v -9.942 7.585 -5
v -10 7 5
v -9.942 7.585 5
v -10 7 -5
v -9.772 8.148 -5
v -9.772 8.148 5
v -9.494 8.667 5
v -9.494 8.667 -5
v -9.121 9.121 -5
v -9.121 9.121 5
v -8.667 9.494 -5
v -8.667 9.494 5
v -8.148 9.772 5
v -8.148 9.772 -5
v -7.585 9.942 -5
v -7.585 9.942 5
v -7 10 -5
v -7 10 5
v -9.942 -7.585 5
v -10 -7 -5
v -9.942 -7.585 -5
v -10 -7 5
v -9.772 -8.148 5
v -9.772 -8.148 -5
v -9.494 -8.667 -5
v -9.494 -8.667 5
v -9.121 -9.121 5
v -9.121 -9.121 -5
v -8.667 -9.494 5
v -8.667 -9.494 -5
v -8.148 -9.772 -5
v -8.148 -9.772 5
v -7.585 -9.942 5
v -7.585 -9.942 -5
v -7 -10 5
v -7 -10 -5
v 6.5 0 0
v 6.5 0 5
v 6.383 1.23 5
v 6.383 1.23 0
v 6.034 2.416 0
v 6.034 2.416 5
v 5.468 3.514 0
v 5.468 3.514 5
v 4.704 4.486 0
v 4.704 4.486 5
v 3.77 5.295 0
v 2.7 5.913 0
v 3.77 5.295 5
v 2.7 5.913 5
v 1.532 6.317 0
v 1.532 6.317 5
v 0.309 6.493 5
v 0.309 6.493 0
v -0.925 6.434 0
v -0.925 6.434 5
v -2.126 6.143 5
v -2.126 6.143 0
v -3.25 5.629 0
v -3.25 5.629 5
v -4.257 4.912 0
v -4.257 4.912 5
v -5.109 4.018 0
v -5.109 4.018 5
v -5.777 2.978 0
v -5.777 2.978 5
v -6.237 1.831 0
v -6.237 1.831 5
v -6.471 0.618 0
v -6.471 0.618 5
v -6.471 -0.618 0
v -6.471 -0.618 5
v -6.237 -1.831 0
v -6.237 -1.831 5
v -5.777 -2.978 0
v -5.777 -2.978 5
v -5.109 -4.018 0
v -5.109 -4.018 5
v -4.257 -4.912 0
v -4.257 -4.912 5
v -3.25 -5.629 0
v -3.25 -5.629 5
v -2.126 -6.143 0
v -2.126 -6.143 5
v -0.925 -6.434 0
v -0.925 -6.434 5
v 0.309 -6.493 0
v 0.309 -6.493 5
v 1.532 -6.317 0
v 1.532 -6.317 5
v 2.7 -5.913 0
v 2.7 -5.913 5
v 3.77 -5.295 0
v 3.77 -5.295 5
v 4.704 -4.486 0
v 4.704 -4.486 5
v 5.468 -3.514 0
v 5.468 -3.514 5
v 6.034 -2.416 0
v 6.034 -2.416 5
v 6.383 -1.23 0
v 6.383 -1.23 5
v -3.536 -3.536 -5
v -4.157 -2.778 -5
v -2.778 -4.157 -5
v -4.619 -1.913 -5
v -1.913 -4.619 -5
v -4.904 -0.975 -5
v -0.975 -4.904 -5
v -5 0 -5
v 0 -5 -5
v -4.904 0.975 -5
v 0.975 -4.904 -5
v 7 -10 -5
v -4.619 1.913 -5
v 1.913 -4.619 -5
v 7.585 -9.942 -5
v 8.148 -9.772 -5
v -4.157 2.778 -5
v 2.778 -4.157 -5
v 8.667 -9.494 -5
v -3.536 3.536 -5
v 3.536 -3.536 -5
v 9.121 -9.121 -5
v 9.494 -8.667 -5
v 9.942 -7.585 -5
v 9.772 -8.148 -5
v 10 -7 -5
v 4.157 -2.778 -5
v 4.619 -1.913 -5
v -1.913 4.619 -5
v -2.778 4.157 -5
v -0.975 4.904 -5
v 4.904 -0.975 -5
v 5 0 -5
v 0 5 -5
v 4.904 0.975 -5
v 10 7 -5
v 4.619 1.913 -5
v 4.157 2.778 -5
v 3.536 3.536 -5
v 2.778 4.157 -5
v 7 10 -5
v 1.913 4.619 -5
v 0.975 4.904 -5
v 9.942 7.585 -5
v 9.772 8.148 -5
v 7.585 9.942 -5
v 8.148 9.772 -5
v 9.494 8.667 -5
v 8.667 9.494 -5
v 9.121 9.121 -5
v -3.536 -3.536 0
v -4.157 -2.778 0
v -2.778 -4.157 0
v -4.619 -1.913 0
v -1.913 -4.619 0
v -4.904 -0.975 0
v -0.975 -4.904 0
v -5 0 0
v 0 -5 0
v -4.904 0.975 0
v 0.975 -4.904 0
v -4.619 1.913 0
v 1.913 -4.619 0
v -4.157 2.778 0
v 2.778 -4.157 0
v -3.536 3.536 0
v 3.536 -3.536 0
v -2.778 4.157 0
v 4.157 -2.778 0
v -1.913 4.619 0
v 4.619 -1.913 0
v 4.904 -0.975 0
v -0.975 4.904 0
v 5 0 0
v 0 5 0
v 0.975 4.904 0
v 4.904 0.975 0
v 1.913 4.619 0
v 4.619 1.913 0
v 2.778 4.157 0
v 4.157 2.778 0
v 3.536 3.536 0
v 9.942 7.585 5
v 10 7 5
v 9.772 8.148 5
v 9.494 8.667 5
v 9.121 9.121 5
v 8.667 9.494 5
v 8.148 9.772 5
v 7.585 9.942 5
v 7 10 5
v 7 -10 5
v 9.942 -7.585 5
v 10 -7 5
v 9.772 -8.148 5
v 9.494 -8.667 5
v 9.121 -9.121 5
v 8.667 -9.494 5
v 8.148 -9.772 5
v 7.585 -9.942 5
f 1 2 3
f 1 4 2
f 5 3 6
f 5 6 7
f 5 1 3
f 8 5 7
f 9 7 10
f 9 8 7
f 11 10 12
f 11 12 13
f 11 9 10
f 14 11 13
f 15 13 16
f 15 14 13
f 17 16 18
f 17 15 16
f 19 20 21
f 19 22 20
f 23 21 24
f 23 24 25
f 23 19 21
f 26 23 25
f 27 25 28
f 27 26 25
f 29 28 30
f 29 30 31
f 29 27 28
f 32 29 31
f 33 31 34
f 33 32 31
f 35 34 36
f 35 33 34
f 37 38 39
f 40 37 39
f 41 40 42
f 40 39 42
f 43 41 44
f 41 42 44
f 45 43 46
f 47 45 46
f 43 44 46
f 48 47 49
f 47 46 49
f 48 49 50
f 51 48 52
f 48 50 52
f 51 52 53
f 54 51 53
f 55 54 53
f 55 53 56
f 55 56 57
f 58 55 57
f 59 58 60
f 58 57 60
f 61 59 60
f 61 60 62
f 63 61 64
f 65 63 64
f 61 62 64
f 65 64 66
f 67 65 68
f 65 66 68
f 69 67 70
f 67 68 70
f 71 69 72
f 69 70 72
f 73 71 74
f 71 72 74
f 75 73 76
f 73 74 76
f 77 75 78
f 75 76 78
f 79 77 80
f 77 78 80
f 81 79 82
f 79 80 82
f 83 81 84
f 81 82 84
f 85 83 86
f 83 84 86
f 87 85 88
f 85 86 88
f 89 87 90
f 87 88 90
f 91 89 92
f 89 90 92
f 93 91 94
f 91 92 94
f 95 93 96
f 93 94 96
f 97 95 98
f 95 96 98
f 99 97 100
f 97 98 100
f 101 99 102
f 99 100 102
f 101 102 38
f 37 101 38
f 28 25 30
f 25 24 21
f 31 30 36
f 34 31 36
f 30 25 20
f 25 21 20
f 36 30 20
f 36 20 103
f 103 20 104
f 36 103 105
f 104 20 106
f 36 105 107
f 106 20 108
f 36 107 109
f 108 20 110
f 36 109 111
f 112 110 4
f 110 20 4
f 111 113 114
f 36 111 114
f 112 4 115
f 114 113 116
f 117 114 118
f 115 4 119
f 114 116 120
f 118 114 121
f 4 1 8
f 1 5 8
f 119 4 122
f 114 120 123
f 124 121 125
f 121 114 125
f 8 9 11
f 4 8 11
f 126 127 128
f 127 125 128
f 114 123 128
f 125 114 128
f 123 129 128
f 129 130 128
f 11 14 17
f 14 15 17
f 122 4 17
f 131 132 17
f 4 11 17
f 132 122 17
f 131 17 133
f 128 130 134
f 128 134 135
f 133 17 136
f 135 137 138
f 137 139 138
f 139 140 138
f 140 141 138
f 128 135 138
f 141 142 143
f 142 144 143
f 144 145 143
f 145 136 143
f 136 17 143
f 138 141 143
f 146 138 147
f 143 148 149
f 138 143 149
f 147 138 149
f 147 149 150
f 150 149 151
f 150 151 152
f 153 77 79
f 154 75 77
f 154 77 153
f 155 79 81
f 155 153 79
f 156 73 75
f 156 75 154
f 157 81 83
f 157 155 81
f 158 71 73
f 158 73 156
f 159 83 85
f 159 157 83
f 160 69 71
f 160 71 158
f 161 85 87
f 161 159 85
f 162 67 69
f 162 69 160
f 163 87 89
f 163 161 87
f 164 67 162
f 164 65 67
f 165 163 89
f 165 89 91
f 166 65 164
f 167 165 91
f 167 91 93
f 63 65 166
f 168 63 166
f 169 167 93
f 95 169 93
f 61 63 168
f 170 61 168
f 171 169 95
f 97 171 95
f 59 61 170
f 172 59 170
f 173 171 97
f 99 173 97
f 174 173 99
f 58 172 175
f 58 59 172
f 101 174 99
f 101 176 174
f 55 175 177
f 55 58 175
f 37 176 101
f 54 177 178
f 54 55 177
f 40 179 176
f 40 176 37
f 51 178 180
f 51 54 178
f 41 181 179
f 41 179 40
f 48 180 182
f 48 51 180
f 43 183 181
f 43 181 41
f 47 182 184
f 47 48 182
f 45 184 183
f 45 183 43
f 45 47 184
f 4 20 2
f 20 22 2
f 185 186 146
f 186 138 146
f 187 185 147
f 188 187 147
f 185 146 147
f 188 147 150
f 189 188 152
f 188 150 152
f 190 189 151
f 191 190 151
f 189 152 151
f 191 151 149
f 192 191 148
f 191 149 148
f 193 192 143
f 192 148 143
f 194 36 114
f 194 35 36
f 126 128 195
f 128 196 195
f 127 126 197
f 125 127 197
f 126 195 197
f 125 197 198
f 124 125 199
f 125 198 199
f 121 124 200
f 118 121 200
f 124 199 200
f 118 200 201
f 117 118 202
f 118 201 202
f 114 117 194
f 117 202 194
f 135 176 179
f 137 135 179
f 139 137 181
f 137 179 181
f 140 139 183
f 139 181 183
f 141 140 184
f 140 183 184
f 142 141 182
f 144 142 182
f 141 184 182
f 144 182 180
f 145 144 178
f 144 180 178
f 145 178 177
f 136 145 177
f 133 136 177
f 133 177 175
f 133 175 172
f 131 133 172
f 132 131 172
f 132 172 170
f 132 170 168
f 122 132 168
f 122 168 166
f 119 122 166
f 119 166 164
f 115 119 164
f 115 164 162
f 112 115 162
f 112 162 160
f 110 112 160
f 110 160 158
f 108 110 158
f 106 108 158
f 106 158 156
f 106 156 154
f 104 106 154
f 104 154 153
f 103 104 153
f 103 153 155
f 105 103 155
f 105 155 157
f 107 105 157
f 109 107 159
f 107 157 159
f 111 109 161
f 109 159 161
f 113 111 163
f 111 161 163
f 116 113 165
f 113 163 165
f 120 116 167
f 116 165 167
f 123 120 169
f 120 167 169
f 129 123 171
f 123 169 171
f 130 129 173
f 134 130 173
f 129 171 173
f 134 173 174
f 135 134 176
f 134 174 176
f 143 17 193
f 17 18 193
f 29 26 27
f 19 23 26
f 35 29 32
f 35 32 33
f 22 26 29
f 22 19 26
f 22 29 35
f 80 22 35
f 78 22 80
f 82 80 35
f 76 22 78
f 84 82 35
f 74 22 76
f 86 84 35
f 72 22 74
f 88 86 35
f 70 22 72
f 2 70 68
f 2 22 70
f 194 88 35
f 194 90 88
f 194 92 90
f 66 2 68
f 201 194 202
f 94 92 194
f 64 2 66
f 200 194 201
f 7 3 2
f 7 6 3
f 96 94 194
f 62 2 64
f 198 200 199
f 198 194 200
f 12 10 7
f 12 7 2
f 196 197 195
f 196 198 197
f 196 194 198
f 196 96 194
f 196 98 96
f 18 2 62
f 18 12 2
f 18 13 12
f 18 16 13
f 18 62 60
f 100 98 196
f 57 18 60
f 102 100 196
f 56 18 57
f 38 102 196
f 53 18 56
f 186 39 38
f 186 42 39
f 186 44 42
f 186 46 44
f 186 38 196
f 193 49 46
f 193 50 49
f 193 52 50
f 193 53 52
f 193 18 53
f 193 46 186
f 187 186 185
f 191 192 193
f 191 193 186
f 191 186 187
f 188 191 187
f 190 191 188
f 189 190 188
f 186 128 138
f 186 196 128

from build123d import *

# Parameters (mm, degrees)
SKETCH1_W           = 20
SKETCH1_H           = 20
BOSS_EXTRUDE1_DEPTH = 5
FILLET1_R           = 3
CUT_EXTRUDE1_REACH  = 19.321
SKETCH2_R           = 5
SKETCH3_R           = 6.5
CUT_EXTRUDE2_DEPTH  = 5


with BuildPart() as part:
    # Sketch1 → Boss-Extrude1 (new, symmetric)
    with BuildSketch(Plane.XY):
        Rectangle(SKETCH1_W, SKETCH1_H)
    extrude(amount=BOSS_EXTRUDE1_DEPTH, both=True)

    # Fillet1
    fillet1_edges = [part.edges().sort_by_distance(p)[0] for p in [
        (10, -10, 0),
        (-10, -10, 0),
        (-10, 10, 0),
        (10, 10, 0),
    ]]
    fillet(fillet1_edges, radius=FILLET1_R)

    # Sketch2 → Cut-Extrude1 (cut, up to next)
    with BuildSketch(Plane.XY.offset(5), mode=Mode.PRIVATE) as cut_extrude1_sk1:
        Circle(SKETCH2_R)
    cut_extrude1_tool1 = extrude(cut_extrude1_sk1.sketch, amount=-CUT_EXTRUDE1_REACH, mode=Mode.PRIVATE) & part.part
    add(cut_extrude1_tool1.solids().sort_by_distance((0, 0, 5))[0], mode=Mode.SUBTRACT)

    # Sketch3 → Cut-Extrude2 (cut)
    with BuildSketch(Plane.XY.offset(5)):
        Circle(SKETCH3_R)
    extrude(amount=-CUT_EXTRUDE2_DEPTH, mode=Mode.SUBTRACT)


solid = part.part
